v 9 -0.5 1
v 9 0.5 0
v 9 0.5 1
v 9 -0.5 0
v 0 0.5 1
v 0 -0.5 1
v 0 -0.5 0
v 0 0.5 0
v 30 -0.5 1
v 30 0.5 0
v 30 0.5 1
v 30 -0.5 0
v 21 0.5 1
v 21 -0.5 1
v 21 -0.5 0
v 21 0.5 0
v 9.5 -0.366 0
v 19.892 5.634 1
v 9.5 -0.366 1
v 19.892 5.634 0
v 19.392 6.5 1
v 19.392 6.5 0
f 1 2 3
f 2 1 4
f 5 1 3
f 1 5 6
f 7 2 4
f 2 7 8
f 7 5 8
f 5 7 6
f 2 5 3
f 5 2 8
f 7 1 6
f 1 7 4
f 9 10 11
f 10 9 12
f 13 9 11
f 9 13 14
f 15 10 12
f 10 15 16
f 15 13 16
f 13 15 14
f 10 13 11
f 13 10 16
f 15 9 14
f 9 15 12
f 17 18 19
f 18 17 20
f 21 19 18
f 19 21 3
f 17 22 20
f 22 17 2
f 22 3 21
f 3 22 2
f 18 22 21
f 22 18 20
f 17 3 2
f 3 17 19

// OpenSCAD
module switch(length, width, thickness, height)
{
    translate([0,-thickness/2,0])cube([length/2-width/2, thickness, height]);
    translate([(length/2+width/2),-thickness/2,0])cube([(length/2-width/2), thickness, height]);
    
    translate([(length/2-width/2),+thickness/2, 0])rotate([0,0,-60])cube([thickness, width, height]);
    
}

switch(30, 12, 1, 1);
